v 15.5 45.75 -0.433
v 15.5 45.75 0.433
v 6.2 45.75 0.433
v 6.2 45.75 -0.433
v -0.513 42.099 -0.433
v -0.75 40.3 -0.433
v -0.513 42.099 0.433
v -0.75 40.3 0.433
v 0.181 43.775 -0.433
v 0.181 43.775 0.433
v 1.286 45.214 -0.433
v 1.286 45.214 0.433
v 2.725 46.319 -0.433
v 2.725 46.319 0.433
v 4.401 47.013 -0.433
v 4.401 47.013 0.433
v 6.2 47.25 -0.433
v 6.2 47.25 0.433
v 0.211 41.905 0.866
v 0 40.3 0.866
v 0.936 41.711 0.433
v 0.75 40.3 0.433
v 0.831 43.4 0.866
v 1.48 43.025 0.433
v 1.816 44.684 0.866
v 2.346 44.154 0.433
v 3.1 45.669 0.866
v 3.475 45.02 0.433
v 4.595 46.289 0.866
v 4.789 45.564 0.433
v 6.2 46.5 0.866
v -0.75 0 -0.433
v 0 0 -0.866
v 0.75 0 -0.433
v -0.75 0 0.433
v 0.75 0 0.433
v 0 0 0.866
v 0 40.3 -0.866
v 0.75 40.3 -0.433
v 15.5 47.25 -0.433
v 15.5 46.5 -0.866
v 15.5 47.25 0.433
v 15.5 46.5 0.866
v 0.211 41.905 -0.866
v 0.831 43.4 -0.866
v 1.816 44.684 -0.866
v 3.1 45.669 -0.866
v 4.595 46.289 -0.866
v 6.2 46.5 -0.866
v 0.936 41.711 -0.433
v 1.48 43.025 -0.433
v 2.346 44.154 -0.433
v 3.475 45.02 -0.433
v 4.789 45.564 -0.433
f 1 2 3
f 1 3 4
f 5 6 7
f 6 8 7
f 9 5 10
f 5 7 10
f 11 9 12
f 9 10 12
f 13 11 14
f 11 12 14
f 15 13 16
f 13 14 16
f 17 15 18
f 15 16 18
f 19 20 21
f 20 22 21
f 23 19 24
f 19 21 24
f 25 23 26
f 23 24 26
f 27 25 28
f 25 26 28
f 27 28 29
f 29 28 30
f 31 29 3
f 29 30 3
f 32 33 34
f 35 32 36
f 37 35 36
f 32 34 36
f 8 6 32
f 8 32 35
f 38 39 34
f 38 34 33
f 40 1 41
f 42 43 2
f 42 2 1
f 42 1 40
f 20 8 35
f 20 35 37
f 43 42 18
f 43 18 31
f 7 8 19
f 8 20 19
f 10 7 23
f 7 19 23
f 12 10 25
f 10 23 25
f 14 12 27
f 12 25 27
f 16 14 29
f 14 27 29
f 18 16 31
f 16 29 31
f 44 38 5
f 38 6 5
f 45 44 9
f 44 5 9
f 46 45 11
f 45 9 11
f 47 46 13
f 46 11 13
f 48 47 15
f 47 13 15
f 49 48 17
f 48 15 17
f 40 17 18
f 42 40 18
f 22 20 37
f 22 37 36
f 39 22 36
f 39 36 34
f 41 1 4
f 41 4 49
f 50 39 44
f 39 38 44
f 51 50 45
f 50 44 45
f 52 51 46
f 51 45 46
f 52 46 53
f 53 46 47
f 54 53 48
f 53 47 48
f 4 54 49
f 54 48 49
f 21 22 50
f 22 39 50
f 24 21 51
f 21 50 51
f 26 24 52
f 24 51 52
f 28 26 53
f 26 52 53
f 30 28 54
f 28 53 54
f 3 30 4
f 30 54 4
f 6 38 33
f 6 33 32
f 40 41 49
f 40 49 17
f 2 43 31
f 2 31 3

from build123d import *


with BuildPart() as part:
    # Sweep1: sweep along a path in Sketch4
    with BuildLine(Plane.XY) as sweep1_path:
        Line((0, 0), (0, 40.3))
        ThreePointArc((0, 40.3), (1.815937957, 44.684062043), (6.2, 46.5))
        Line((6.2, 46.5), (15.5, 46.5))
    # Sketch3 → Sweep1 (sweep)
    with BuildSketch(Plane(origin=(0, 0, 0), x_dir=(1, 0, 0), z_dir=(0, 1, 0))):
        Polygon((0, 0.866025404), (-0.75, 0.433012702), (-0.75, -0.433012702), (0, -0.866025404), (0.75, -0.433012702), (0.75, 0.433012702), align=None)
    sweep(path=sweep1_path.line)


solid = part.part
